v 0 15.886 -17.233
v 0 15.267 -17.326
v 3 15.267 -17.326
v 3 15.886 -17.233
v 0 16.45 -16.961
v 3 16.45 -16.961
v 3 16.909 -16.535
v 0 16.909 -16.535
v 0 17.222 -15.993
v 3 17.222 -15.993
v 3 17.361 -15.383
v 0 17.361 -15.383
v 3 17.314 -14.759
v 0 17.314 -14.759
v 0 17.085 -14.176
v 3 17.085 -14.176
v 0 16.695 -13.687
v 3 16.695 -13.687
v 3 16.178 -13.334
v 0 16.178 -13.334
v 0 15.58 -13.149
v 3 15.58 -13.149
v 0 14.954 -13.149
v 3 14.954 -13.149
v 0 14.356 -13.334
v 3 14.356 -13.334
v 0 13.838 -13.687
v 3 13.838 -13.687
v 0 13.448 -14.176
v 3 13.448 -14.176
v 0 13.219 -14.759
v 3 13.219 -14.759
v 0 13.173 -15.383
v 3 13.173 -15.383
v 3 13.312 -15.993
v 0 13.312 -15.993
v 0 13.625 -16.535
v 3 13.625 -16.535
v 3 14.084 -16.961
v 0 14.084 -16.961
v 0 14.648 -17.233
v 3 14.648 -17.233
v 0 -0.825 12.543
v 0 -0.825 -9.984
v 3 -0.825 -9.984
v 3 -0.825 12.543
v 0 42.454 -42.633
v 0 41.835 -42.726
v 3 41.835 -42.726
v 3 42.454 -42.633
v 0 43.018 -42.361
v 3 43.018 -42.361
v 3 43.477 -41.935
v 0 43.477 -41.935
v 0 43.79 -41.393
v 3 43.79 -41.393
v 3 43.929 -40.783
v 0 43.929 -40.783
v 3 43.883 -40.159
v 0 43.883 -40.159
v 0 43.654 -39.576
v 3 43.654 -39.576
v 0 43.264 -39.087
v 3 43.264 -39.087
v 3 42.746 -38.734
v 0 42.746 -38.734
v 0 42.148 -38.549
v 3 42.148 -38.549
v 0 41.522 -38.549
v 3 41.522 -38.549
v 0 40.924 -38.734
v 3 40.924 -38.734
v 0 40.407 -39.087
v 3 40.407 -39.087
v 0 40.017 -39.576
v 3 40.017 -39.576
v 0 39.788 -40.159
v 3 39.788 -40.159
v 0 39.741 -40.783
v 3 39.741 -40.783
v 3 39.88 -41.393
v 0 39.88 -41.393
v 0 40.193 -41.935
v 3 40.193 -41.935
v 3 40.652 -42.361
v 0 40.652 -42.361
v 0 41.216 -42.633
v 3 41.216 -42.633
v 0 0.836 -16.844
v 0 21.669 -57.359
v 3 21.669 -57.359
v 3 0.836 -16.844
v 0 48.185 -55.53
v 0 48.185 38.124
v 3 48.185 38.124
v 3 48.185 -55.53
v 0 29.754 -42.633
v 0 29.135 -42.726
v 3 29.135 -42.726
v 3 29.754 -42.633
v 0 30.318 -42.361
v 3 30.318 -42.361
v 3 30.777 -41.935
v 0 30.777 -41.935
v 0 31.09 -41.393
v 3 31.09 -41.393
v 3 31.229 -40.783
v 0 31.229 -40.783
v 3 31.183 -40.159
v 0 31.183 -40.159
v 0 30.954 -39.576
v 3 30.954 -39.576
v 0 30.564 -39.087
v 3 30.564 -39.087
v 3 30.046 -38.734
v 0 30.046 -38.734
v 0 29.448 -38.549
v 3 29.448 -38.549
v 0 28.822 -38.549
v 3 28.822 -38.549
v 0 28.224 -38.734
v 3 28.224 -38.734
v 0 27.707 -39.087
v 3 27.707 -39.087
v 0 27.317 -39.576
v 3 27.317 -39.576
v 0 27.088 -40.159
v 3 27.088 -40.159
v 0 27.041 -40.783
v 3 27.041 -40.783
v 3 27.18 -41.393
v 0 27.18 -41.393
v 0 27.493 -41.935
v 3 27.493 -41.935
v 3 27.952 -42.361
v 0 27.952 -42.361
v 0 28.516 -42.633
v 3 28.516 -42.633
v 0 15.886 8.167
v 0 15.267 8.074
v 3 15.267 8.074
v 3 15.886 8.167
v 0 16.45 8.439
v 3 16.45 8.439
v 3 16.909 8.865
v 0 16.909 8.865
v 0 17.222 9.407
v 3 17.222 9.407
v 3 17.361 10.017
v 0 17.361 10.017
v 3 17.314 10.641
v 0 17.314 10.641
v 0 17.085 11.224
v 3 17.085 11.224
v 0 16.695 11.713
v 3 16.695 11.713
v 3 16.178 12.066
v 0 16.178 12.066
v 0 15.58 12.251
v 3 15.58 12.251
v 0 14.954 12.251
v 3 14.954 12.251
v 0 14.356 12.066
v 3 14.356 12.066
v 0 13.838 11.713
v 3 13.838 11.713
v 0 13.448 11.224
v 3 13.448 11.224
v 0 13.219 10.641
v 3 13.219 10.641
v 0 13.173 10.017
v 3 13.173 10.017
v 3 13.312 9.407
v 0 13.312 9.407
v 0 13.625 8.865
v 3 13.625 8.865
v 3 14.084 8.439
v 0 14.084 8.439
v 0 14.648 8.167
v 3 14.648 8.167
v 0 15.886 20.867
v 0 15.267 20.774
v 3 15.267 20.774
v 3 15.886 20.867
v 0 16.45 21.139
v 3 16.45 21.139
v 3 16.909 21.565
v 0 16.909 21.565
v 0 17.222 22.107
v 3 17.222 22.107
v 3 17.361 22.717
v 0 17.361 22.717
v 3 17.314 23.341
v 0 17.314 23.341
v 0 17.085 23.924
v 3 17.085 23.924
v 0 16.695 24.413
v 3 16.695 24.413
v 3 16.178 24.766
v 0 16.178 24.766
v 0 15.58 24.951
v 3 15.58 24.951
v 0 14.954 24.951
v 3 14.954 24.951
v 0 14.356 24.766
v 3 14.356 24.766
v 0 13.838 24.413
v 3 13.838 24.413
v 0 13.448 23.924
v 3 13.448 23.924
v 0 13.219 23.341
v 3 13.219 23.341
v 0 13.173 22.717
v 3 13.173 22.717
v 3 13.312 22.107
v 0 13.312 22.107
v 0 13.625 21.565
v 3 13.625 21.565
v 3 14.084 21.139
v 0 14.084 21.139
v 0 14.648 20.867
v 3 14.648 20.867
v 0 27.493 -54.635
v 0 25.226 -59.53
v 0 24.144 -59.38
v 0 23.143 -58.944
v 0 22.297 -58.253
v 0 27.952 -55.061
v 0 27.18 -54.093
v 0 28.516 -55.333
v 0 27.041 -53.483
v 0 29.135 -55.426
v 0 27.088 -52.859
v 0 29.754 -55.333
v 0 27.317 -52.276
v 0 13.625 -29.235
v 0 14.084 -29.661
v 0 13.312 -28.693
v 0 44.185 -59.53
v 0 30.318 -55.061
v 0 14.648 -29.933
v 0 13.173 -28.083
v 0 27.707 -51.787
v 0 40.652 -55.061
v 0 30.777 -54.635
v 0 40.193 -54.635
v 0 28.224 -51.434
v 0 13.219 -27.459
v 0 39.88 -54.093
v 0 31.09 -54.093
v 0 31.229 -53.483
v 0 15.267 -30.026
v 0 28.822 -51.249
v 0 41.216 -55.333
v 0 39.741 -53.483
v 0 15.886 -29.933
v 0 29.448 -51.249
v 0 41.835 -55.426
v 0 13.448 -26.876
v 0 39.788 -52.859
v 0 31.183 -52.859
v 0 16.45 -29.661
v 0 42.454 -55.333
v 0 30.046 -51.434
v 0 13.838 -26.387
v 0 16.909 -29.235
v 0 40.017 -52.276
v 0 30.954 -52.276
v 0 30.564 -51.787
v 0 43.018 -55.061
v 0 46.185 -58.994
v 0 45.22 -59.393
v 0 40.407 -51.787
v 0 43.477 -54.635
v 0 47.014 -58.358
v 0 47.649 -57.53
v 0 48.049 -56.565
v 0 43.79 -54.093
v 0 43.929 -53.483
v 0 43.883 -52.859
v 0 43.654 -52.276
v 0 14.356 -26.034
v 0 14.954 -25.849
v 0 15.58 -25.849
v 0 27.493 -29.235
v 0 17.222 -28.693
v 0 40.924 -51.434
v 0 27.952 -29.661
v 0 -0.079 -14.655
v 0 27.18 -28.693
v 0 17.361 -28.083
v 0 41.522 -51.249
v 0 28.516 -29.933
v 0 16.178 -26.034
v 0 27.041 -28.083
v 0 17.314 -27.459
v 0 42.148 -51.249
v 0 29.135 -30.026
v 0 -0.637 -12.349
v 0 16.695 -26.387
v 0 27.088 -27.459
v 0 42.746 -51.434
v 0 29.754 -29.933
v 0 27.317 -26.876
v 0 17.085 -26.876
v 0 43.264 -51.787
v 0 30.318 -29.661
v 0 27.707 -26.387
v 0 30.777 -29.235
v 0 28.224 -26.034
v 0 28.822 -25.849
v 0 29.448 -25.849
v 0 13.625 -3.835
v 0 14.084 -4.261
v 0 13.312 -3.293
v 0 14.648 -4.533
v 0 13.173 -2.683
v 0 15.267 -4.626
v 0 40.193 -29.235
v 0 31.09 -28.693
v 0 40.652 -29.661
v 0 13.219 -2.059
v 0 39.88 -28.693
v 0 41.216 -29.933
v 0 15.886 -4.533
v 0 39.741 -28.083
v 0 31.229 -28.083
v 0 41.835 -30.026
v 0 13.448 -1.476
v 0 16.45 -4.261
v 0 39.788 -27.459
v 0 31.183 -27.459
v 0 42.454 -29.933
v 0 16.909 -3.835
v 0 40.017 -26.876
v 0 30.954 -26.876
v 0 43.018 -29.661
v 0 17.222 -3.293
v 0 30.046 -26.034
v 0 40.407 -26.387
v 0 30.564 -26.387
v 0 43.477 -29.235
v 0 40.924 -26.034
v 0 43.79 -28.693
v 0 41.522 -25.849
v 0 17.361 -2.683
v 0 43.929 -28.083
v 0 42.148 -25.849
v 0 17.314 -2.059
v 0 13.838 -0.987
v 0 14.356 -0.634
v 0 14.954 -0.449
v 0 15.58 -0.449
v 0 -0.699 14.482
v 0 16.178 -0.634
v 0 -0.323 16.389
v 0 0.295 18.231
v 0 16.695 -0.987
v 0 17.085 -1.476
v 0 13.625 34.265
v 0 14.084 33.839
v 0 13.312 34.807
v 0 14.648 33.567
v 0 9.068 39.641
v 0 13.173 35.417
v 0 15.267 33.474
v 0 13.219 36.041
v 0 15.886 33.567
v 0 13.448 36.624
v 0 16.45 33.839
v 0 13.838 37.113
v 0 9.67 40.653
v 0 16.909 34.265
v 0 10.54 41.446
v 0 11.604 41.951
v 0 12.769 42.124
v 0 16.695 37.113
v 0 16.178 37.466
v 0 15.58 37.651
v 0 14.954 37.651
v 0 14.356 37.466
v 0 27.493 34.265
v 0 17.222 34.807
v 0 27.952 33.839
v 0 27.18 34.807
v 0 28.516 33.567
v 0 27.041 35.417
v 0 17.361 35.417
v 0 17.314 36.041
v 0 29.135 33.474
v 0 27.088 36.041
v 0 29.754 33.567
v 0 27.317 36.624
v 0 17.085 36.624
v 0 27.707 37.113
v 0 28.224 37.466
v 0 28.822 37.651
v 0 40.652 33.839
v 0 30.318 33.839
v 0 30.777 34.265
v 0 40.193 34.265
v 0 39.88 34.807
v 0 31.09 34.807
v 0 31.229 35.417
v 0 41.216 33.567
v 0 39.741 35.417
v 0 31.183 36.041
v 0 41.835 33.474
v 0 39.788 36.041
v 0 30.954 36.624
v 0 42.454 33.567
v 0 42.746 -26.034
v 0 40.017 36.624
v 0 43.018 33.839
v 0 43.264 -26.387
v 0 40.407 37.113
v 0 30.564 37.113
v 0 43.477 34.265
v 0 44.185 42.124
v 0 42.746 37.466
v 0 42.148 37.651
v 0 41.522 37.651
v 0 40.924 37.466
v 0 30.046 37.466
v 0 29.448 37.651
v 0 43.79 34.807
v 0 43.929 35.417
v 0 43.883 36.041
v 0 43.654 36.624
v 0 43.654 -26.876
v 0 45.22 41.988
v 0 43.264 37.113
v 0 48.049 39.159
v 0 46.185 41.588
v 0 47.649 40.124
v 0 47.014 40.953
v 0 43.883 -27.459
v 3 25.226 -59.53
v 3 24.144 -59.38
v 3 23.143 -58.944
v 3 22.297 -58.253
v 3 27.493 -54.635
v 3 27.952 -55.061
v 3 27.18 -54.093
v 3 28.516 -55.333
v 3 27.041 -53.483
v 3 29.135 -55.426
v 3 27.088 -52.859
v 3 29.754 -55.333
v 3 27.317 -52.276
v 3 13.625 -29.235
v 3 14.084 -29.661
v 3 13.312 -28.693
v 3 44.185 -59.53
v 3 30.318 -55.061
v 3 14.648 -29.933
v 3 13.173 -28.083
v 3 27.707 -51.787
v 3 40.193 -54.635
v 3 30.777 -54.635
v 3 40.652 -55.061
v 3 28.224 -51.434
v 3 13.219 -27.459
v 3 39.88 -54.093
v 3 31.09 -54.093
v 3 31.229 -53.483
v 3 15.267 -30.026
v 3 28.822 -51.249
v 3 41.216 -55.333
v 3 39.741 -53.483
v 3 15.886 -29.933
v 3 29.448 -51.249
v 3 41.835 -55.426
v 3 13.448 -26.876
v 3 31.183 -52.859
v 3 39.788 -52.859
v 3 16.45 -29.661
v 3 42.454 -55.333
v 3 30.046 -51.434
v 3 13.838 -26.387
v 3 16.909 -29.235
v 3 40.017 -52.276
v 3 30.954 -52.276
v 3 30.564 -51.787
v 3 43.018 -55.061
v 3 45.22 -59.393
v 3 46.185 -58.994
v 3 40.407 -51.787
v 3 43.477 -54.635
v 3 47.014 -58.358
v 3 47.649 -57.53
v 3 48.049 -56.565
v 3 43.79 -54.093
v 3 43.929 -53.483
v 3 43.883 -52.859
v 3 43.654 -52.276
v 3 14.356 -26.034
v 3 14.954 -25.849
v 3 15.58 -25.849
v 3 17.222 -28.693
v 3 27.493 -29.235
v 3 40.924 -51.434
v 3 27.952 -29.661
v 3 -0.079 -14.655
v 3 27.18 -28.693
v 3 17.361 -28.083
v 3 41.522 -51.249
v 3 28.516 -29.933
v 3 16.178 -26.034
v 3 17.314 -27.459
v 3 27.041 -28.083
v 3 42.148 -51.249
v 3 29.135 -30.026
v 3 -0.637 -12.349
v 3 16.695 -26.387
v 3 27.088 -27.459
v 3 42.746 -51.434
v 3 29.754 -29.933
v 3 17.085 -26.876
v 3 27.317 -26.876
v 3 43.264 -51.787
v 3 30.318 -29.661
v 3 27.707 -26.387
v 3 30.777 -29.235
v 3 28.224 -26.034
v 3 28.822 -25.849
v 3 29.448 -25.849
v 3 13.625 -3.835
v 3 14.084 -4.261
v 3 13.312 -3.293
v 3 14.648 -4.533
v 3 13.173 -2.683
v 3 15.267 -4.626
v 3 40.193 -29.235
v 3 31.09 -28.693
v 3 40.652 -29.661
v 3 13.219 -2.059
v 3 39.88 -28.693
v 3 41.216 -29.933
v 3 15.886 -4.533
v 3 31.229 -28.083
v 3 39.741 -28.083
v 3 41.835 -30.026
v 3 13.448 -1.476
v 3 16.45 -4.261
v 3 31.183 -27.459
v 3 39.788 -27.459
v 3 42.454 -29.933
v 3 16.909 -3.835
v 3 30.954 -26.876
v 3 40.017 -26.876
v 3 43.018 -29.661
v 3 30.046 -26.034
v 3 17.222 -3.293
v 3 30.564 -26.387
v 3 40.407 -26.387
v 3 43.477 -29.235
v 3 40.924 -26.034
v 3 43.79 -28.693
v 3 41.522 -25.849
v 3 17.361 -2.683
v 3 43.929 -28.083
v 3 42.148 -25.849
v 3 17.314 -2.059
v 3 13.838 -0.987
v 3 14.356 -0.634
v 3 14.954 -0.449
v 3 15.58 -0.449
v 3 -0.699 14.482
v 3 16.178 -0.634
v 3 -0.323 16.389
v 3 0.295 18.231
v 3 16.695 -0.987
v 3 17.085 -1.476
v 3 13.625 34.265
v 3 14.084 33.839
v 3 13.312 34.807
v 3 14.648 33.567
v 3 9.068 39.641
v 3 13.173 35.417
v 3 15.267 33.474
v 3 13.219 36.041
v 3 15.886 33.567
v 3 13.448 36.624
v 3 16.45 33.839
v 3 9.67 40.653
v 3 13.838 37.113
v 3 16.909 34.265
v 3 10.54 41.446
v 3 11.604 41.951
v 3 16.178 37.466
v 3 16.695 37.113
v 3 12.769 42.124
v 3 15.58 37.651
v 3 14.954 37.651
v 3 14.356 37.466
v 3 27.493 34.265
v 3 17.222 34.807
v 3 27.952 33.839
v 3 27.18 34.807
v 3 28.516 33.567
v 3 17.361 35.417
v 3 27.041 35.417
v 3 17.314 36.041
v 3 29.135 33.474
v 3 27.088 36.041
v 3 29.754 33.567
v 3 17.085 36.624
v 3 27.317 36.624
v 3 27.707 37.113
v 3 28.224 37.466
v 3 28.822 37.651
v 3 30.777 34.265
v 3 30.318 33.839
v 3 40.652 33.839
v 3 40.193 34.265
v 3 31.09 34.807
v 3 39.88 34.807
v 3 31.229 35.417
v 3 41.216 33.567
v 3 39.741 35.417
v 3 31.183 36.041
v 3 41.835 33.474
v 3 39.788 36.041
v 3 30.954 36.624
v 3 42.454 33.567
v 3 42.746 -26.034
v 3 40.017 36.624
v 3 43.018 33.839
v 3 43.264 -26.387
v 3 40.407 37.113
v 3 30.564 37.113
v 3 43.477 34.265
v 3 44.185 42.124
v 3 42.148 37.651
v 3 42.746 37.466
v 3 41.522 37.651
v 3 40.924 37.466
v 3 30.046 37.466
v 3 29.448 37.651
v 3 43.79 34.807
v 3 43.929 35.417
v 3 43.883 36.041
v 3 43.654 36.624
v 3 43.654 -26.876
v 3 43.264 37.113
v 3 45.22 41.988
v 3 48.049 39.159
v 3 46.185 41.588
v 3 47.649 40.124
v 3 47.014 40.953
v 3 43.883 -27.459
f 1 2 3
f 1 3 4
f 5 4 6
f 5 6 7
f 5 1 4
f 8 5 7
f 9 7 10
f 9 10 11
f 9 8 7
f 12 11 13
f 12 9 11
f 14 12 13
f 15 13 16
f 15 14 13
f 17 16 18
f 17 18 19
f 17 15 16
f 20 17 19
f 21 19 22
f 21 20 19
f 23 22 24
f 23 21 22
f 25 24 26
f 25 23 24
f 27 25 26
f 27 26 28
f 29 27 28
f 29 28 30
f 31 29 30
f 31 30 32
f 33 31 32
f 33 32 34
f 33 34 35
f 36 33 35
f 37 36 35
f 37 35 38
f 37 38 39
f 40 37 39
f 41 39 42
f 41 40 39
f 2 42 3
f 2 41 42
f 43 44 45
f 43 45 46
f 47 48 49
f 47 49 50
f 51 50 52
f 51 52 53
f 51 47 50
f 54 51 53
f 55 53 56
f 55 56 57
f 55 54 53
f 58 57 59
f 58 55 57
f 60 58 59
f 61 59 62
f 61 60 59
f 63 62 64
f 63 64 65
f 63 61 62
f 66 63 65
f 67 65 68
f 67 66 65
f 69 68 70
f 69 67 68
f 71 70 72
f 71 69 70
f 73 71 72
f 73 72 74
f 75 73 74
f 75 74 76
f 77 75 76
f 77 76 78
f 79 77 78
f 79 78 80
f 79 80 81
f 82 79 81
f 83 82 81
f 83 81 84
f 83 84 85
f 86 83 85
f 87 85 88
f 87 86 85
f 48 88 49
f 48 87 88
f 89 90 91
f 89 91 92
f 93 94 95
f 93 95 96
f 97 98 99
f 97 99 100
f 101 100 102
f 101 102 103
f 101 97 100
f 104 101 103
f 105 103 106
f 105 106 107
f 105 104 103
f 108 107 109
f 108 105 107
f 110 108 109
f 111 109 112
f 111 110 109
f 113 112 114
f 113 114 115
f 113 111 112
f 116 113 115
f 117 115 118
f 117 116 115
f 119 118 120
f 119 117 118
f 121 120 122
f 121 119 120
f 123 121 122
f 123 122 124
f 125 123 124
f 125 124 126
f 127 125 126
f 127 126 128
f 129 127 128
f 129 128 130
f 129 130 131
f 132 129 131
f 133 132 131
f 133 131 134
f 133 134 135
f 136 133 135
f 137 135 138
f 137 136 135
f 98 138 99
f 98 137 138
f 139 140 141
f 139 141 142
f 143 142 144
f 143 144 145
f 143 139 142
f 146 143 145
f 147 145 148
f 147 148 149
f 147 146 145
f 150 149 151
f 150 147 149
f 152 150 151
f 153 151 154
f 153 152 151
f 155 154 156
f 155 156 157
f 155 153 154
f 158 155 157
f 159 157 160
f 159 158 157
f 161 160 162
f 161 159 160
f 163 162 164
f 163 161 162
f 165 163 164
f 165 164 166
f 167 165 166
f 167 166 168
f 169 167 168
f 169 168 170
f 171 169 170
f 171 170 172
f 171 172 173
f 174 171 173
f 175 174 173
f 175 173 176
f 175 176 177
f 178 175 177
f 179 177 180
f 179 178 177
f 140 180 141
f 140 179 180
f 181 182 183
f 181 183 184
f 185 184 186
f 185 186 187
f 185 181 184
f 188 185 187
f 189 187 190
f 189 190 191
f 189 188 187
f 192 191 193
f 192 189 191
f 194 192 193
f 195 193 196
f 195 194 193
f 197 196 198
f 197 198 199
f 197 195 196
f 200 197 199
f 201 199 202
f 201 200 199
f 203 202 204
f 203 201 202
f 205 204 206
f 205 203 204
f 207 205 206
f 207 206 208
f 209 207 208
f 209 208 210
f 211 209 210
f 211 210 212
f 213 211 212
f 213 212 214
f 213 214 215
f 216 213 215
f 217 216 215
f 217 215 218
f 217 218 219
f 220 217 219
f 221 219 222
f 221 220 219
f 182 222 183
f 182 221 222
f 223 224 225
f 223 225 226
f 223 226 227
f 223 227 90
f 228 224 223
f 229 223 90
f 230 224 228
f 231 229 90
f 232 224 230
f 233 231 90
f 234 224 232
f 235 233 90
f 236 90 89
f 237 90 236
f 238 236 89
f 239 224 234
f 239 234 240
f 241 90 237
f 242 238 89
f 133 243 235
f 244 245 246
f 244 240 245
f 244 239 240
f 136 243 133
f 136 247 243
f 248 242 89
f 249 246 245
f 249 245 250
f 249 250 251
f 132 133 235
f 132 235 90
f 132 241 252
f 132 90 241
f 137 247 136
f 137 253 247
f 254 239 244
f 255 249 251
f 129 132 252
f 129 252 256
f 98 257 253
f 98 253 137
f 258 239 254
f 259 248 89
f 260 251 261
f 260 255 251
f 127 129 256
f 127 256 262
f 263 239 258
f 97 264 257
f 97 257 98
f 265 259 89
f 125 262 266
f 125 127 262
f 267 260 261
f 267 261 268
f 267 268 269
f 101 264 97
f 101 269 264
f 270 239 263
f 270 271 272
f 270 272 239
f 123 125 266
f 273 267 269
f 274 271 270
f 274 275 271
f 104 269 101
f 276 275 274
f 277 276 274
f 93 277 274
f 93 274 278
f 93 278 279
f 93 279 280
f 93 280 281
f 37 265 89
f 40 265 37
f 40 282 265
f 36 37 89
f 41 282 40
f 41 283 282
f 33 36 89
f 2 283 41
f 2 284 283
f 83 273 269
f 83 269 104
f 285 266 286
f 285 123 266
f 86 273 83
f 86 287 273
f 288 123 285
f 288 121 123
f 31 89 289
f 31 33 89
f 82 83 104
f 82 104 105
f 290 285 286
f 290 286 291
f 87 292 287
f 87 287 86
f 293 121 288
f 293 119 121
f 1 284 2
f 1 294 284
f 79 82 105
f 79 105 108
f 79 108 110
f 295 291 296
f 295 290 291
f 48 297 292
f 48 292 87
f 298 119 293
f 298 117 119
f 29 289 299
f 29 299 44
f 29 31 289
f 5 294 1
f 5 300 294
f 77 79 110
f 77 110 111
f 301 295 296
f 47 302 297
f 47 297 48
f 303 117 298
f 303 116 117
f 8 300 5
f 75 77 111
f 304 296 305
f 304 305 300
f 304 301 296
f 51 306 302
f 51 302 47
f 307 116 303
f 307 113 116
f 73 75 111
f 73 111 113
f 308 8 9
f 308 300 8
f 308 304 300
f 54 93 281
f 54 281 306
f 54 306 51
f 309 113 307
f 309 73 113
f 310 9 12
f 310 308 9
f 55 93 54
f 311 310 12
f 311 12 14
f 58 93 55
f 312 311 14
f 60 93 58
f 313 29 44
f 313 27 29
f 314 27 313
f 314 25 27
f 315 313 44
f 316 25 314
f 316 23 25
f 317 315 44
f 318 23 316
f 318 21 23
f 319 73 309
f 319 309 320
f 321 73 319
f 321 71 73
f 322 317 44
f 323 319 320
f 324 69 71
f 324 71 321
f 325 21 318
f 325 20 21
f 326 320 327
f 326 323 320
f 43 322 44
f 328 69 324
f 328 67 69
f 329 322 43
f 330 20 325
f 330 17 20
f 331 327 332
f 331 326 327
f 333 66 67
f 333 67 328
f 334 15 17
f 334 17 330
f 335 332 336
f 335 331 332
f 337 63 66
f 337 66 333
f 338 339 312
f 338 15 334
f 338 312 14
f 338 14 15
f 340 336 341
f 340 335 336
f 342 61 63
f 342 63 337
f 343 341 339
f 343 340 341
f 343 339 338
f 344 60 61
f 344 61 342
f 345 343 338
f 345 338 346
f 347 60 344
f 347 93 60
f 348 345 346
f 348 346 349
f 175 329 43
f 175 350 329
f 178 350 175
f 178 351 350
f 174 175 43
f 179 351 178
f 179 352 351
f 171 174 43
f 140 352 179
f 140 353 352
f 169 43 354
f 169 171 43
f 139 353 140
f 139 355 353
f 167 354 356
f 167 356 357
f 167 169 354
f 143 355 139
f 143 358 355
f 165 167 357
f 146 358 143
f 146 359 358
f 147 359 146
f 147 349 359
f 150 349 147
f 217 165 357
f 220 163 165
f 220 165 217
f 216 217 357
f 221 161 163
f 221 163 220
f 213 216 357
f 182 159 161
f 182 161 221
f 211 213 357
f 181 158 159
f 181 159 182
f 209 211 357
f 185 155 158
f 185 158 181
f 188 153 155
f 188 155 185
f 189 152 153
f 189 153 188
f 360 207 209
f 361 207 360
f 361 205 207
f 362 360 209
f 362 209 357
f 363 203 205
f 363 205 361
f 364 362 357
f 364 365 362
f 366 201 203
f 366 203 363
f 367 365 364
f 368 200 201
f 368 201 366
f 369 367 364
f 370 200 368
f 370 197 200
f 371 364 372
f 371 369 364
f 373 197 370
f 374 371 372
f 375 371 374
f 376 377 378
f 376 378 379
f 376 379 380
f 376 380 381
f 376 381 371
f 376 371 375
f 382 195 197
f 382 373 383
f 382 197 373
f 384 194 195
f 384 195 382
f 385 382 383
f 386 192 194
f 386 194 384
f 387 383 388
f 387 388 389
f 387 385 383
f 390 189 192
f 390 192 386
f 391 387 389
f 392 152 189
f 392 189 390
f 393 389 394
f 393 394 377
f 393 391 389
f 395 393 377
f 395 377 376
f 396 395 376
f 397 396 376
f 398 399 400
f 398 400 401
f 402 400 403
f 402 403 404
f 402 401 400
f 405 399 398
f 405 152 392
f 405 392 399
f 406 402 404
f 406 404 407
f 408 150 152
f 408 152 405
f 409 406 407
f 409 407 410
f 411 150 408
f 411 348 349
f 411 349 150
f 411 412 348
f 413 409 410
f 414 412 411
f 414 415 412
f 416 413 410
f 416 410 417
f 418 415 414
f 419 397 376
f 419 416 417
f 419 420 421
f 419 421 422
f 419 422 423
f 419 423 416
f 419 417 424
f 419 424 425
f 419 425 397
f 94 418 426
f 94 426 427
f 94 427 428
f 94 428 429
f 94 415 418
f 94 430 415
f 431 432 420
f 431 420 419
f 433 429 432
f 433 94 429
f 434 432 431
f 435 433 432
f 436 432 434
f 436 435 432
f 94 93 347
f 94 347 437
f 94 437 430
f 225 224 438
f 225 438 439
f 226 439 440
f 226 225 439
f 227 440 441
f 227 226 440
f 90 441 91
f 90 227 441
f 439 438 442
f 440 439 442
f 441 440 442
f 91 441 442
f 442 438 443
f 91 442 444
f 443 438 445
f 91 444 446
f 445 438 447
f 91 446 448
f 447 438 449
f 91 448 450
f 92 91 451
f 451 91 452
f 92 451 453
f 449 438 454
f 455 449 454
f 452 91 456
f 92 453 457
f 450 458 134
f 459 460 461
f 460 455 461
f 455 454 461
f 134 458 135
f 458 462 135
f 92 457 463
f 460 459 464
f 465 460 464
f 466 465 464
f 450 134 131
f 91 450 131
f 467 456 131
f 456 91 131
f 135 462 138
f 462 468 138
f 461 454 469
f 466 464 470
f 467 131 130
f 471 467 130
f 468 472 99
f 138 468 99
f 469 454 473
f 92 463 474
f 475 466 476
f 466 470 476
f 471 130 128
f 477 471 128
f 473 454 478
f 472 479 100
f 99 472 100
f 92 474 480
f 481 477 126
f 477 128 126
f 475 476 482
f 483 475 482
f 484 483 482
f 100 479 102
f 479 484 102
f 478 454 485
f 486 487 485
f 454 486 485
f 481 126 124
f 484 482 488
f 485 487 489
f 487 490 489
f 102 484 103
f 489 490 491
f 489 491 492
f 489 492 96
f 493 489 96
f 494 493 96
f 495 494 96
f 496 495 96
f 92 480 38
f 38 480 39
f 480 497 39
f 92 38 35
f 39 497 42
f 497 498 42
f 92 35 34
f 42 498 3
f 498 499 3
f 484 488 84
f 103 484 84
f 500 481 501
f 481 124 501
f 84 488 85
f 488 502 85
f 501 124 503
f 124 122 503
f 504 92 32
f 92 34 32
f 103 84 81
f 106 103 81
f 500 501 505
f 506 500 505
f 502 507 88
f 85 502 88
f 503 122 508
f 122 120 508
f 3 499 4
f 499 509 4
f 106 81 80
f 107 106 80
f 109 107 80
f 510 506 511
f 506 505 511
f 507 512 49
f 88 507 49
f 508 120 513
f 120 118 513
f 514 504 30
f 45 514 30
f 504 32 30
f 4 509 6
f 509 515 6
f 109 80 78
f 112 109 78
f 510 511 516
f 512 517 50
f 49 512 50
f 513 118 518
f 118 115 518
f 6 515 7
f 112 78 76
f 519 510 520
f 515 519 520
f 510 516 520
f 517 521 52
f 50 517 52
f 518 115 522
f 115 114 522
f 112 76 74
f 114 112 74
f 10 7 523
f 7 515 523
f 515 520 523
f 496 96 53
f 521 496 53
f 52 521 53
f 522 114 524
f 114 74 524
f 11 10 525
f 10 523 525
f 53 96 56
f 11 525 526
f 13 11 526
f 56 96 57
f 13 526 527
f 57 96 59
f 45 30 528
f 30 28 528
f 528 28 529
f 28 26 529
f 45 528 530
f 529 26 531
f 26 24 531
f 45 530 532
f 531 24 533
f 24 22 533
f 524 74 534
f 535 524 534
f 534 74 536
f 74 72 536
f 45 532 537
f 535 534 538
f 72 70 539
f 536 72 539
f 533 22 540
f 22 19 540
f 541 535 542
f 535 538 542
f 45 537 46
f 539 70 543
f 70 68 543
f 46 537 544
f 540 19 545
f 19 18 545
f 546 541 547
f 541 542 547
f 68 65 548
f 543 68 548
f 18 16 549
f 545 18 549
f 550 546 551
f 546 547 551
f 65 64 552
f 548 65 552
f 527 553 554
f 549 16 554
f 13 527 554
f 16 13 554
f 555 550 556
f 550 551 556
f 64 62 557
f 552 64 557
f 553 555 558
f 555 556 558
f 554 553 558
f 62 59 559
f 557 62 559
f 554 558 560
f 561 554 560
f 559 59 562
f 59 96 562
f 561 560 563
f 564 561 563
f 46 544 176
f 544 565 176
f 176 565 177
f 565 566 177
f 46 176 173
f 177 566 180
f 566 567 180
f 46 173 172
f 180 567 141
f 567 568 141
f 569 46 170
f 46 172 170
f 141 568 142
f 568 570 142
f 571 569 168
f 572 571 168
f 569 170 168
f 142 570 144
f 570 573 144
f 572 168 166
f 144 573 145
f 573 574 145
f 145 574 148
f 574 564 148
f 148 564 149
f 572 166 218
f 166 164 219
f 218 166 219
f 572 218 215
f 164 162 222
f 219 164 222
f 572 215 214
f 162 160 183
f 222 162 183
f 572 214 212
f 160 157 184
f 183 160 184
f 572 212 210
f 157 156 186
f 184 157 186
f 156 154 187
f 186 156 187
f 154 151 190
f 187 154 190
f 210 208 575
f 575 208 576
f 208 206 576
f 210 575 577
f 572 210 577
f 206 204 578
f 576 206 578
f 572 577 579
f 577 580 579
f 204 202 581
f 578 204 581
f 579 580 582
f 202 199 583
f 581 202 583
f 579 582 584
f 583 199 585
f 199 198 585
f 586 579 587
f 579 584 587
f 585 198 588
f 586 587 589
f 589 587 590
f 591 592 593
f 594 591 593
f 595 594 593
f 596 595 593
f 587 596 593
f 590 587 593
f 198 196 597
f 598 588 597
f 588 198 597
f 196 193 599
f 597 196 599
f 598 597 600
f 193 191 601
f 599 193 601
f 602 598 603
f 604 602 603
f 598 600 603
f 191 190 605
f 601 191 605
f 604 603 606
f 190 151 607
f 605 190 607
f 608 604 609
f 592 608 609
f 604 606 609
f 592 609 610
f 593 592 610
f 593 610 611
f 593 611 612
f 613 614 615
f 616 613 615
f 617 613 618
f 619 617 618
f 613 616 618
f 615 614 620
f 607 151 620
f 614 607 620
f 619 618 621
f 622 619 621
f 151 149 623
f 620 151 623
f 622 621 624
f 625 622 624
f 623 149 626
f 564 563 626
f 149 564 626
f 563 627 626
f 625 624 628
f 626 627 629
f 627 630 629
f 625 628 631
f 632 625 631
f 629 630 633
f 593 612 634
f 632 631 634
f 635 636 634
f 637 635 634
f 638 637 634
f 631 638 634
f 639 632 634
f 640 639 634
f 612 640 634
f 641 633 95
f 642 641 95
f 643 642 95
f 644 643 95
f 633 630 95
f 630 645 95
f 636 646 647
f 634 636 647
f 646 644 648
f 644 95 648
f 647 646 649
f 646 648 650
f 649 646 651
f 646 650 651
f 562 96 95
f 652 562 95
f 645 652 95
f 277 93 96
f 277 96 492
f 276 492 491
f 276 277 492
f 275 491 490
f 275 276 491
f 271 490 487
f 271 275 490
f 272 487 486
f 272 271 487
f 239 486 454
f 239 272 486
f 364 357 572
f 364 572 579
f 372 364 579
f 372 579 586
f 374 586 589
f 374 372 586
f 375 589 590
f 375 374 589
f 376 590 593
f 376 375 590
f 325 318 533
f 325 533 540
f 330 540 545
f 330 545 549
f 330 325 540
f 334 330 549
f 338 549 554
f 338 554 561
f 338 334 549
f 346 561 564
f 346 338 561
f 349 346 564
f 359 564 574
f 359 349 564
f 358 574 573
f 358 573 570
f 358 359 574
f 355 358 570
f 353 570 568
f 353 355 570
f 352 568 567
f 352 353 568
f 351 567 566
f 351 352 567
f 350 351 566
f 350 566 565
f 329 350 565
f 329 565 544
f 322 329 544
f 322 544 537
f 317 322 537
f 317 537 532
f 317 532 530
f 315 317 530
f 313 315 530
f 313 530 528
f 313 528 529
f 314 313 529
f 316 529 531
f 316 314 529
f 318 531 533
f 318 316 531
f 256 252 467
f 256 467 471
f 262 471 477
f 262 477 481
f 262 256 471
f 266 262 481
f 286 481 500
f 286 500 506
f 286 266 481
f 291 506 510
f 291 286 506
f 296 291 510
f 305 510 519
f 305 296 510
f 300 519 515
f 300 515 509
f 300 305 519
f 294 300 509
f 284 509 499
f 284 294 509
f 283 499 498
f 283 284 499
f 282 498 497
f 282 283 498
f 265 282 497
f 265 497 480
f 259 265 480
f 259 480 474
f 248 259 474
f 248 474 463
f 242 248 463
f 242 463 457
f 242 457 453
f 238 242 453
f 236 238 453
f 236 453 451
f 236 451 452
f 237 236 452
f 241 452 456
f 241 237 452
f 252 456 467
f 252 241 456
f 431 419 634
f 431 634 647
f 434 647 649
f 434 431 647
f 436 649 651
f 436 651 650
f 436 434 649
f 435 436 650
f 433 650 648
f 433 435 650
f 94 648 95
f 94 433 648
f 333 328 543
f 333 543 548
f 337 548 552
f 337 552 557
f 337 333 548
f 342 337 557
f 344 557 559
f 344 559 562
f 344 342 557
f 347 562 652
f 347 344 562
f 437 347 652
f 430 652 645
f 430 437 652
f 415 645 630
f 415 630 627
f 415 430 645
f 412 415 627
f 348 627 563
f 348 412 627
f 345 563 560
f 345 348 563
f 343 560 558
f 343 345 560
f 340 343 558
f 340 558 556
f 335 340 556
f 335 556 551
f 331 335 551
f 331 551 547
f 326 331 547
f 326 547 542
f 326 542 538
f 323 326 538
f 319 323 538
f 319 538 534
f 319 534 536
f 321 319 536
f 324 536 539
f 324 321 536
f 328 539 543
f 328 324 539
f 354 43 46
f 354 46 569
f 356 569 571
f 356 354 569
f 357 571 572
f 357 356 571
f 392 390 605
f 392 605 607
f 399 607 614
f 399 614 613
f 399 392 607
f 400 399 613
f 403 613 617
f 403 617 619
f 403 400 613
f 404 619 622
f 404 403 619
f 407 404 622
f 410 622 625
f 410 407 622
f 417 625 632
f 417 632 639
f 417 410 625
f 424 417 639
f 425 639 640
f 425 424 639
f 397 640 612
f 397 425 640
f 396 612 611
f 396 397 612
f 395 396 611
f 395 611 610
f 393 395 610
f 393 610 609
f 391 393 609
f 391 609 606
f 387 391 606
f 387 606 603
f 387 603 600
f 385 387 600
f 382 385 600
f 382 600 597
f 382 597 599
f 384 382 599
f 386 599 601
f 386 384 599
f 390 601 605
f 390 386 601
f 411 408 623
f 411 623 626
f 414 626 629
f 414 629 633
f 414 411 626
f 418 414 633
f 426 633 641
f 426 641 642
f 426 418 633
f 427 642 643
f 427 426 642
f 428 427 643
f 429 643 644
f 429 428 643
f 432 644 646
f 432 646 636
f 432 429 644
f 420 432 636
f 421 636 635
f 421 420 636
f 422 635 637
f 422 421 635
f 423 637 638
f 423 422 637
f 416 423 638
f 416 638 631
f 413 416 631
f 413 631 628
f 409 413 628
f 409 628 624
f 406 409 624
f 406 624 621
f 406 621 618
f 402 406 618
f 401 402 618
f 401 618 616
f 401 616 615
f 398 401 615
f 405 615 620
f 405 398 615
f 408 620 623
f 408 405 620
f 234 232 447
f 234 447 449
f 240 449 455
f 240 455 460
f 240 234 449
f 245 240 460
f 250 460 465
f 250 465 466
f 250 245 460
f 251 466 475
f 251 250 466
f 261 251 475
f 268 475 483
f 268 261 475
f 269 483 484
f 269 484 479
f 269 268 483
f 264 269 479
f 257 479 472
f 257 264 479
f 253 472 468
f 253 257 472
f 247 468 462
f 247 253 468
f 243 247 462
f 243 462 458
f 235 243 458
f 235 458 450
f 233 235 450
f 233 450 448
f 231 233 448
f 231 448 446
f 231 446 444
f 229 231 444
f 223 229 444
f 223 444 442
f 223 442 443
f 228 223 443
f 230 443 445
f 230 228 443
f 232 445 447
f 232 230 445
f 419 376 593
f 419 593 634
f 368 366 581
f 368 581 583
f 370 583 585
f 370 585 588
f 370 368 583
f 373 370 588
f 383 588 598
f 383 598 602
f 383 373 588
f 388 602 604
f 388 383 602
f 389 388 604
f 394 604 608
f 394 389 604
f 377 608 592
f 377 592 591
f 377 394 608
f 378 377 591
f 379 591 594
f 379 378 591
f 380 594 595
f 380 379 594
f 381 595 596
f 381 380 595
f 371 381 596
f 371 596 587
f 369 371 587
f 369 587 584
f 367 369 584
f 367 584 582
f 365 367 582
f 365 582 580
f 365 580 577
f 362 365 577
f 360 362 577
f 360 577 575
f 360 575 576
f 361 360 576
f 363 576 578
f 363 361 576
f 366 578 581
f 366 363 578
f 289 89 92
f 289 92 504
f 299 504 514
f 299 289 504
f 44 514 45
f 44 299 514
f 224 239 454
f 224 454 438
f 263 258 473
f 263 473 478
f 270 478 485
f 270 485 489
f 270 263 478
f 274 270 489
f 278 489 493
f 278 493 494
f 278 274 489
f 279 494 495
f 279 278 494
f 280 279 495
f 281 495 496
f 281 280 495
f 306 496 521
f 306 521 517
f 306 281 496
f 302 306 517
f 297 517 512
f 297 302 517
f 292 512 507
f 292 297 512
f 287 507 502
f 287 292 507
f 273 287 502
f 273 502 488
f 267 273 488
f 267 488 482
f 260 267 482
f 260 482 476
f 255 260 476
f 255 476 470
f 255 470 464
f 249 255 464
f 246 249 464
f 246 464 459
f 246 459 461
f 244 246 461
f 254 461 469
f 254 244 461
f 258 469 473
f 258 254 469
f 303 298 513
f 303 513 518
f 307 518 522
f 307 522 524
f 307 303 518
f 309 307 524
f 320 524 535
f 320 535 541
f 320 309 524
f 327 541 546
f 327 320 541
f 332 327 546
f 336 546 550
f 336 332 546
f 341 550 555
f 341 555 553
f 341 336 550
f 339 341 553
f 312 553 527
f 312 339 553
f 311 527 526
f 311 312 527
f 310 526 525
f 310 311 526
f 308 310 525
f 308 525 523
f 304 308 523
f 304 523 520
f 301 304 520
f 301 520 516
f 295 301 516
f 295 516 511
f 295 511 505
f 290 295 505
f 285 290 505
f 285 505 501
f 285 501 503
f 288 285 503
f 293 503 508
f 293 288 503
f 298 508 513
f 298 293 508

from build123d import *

# Parameters (mm, degrees)
SKETCH_1_R      = 2.1
EXTRUDE_1_DEPTH = 3


with BuildPart() as part:
    # 草图1 → 凸台-拉伸1 (new body)
    with BuildSketch(Plane(origin=(0, 0, 0), x_dir=(0, 0, -1), z_dir=(1, 0, 0))):
        with BuildLine():
            Line((59.529555332, 44.185221984), (59.529555332, 25.226213997))
            ThreePointArc((59.529555332, 25.226213997), (58.943993255, 23.142560073), (57.358748495, 21.668960509))
            Line((57.358748495, 21.668960509), (16.843911029, 0.835622672))
            ThreePointArc((16.843911029, 0.835622672), (13.51321063, -0.403694355), (9.984436669, -0.82467675))
            Line((9.984436669, -0.82467675), (-12.543438126, -0.82467675))
            ThreePointArc((-12.543438126, -0.82467675), (-15.441612868, -0.542033278), (-18.230567587, 0.295245495))
            Line((-18.230567587, 0.295245495), (-39.640671861, 9.067677244))
            ThreePointArc((-39.640671861, 9.067677244), (-41.445720436, 10.540385022), (-42.124104005, 12.769031312))
            Line((-42.124104005, 12.769031312), (-42.124104005, 44.185221984))
            ThreePointArc((-42.124104005, 44.185221984), (-40.95253113, 47.013649109), (-38.124104005, 48.185221984))
            Line((-38.124104005, 48.185221984), (-2.92315645, 48.185221984))
            Line((-2.92315645, 48.185221984), (55.529555332, 48.185221984))
            ThreePointArc((55.529555332, 48.185221984), (58.357982457, 47.013649109), (59.529555332, 44.185221984))
        make_face()
        with Locations((40.626001942, 41.835221984)):
            Circle(SKETCH_1_R, mode=Mode.SUBTRACT)
        with Locations((-35.573998058, 15.266821984)):
            Circle(SKETCH_1_R, mode=Mode.SUBTRACT)
        with Locations((-22.873998058, 15.266821984)):
            Circle(SKETCH_1_R, mode=Mode.SUBTRACT)
        with Locations((-10.173998058, 15.266821984)):
            Circle(SKETCH_1_R, mode=Mode.SUBTRACT)
        with Locations((2.526001942, 15.266821984)):
            Circle(SKETCH_1_R, mode=Mode.SUBTRACT)
        with Locations((15.226001942, 15.266821984)):
            Circle(SKETCH_1_R, mode=Mode.SUBTRACT)
        with Locations((27.926001942, 15.266821984)):
            Circle(SKETCH_1_R, mode=Mode.SUBTRACT)
        with Locations((53.326001942, 41.835221984)):
            Circle(SKETCH_1_R, mode=Mode.SUBTRACT)
        with Locations((53.326001942, 29.135221984)):
            Circle(SKETCH_1_R, mode=Mode.SUBTRACT)
        with Locations((40.626001942, 29.135221984)):
            Circle(SKETCH_1_R, mode=Mode.SUBTRACT)
        with Locations((-35.573998058, 41.835221984)):
            Circle(SKETCH_1_R, mode=Mode.SUBTRACT)
        with Locations((-35.573998058, 29.135221984)):
            Circle(SKETCH_1_R, mode=Mode.SUBTRACT)
        with Locations((27.926001942, 41.835221984)):
            Circle(SKETCH_1_R, mode=Mode.SUBTRACT)
        with Locations((27.926001942, 29.135221984)):
            Circle(SKETCH_1_R, mode=Mode.SUBTRACT)
    extrude(amount=EXTRUDE_1_DEPTH)


solid = part.part
